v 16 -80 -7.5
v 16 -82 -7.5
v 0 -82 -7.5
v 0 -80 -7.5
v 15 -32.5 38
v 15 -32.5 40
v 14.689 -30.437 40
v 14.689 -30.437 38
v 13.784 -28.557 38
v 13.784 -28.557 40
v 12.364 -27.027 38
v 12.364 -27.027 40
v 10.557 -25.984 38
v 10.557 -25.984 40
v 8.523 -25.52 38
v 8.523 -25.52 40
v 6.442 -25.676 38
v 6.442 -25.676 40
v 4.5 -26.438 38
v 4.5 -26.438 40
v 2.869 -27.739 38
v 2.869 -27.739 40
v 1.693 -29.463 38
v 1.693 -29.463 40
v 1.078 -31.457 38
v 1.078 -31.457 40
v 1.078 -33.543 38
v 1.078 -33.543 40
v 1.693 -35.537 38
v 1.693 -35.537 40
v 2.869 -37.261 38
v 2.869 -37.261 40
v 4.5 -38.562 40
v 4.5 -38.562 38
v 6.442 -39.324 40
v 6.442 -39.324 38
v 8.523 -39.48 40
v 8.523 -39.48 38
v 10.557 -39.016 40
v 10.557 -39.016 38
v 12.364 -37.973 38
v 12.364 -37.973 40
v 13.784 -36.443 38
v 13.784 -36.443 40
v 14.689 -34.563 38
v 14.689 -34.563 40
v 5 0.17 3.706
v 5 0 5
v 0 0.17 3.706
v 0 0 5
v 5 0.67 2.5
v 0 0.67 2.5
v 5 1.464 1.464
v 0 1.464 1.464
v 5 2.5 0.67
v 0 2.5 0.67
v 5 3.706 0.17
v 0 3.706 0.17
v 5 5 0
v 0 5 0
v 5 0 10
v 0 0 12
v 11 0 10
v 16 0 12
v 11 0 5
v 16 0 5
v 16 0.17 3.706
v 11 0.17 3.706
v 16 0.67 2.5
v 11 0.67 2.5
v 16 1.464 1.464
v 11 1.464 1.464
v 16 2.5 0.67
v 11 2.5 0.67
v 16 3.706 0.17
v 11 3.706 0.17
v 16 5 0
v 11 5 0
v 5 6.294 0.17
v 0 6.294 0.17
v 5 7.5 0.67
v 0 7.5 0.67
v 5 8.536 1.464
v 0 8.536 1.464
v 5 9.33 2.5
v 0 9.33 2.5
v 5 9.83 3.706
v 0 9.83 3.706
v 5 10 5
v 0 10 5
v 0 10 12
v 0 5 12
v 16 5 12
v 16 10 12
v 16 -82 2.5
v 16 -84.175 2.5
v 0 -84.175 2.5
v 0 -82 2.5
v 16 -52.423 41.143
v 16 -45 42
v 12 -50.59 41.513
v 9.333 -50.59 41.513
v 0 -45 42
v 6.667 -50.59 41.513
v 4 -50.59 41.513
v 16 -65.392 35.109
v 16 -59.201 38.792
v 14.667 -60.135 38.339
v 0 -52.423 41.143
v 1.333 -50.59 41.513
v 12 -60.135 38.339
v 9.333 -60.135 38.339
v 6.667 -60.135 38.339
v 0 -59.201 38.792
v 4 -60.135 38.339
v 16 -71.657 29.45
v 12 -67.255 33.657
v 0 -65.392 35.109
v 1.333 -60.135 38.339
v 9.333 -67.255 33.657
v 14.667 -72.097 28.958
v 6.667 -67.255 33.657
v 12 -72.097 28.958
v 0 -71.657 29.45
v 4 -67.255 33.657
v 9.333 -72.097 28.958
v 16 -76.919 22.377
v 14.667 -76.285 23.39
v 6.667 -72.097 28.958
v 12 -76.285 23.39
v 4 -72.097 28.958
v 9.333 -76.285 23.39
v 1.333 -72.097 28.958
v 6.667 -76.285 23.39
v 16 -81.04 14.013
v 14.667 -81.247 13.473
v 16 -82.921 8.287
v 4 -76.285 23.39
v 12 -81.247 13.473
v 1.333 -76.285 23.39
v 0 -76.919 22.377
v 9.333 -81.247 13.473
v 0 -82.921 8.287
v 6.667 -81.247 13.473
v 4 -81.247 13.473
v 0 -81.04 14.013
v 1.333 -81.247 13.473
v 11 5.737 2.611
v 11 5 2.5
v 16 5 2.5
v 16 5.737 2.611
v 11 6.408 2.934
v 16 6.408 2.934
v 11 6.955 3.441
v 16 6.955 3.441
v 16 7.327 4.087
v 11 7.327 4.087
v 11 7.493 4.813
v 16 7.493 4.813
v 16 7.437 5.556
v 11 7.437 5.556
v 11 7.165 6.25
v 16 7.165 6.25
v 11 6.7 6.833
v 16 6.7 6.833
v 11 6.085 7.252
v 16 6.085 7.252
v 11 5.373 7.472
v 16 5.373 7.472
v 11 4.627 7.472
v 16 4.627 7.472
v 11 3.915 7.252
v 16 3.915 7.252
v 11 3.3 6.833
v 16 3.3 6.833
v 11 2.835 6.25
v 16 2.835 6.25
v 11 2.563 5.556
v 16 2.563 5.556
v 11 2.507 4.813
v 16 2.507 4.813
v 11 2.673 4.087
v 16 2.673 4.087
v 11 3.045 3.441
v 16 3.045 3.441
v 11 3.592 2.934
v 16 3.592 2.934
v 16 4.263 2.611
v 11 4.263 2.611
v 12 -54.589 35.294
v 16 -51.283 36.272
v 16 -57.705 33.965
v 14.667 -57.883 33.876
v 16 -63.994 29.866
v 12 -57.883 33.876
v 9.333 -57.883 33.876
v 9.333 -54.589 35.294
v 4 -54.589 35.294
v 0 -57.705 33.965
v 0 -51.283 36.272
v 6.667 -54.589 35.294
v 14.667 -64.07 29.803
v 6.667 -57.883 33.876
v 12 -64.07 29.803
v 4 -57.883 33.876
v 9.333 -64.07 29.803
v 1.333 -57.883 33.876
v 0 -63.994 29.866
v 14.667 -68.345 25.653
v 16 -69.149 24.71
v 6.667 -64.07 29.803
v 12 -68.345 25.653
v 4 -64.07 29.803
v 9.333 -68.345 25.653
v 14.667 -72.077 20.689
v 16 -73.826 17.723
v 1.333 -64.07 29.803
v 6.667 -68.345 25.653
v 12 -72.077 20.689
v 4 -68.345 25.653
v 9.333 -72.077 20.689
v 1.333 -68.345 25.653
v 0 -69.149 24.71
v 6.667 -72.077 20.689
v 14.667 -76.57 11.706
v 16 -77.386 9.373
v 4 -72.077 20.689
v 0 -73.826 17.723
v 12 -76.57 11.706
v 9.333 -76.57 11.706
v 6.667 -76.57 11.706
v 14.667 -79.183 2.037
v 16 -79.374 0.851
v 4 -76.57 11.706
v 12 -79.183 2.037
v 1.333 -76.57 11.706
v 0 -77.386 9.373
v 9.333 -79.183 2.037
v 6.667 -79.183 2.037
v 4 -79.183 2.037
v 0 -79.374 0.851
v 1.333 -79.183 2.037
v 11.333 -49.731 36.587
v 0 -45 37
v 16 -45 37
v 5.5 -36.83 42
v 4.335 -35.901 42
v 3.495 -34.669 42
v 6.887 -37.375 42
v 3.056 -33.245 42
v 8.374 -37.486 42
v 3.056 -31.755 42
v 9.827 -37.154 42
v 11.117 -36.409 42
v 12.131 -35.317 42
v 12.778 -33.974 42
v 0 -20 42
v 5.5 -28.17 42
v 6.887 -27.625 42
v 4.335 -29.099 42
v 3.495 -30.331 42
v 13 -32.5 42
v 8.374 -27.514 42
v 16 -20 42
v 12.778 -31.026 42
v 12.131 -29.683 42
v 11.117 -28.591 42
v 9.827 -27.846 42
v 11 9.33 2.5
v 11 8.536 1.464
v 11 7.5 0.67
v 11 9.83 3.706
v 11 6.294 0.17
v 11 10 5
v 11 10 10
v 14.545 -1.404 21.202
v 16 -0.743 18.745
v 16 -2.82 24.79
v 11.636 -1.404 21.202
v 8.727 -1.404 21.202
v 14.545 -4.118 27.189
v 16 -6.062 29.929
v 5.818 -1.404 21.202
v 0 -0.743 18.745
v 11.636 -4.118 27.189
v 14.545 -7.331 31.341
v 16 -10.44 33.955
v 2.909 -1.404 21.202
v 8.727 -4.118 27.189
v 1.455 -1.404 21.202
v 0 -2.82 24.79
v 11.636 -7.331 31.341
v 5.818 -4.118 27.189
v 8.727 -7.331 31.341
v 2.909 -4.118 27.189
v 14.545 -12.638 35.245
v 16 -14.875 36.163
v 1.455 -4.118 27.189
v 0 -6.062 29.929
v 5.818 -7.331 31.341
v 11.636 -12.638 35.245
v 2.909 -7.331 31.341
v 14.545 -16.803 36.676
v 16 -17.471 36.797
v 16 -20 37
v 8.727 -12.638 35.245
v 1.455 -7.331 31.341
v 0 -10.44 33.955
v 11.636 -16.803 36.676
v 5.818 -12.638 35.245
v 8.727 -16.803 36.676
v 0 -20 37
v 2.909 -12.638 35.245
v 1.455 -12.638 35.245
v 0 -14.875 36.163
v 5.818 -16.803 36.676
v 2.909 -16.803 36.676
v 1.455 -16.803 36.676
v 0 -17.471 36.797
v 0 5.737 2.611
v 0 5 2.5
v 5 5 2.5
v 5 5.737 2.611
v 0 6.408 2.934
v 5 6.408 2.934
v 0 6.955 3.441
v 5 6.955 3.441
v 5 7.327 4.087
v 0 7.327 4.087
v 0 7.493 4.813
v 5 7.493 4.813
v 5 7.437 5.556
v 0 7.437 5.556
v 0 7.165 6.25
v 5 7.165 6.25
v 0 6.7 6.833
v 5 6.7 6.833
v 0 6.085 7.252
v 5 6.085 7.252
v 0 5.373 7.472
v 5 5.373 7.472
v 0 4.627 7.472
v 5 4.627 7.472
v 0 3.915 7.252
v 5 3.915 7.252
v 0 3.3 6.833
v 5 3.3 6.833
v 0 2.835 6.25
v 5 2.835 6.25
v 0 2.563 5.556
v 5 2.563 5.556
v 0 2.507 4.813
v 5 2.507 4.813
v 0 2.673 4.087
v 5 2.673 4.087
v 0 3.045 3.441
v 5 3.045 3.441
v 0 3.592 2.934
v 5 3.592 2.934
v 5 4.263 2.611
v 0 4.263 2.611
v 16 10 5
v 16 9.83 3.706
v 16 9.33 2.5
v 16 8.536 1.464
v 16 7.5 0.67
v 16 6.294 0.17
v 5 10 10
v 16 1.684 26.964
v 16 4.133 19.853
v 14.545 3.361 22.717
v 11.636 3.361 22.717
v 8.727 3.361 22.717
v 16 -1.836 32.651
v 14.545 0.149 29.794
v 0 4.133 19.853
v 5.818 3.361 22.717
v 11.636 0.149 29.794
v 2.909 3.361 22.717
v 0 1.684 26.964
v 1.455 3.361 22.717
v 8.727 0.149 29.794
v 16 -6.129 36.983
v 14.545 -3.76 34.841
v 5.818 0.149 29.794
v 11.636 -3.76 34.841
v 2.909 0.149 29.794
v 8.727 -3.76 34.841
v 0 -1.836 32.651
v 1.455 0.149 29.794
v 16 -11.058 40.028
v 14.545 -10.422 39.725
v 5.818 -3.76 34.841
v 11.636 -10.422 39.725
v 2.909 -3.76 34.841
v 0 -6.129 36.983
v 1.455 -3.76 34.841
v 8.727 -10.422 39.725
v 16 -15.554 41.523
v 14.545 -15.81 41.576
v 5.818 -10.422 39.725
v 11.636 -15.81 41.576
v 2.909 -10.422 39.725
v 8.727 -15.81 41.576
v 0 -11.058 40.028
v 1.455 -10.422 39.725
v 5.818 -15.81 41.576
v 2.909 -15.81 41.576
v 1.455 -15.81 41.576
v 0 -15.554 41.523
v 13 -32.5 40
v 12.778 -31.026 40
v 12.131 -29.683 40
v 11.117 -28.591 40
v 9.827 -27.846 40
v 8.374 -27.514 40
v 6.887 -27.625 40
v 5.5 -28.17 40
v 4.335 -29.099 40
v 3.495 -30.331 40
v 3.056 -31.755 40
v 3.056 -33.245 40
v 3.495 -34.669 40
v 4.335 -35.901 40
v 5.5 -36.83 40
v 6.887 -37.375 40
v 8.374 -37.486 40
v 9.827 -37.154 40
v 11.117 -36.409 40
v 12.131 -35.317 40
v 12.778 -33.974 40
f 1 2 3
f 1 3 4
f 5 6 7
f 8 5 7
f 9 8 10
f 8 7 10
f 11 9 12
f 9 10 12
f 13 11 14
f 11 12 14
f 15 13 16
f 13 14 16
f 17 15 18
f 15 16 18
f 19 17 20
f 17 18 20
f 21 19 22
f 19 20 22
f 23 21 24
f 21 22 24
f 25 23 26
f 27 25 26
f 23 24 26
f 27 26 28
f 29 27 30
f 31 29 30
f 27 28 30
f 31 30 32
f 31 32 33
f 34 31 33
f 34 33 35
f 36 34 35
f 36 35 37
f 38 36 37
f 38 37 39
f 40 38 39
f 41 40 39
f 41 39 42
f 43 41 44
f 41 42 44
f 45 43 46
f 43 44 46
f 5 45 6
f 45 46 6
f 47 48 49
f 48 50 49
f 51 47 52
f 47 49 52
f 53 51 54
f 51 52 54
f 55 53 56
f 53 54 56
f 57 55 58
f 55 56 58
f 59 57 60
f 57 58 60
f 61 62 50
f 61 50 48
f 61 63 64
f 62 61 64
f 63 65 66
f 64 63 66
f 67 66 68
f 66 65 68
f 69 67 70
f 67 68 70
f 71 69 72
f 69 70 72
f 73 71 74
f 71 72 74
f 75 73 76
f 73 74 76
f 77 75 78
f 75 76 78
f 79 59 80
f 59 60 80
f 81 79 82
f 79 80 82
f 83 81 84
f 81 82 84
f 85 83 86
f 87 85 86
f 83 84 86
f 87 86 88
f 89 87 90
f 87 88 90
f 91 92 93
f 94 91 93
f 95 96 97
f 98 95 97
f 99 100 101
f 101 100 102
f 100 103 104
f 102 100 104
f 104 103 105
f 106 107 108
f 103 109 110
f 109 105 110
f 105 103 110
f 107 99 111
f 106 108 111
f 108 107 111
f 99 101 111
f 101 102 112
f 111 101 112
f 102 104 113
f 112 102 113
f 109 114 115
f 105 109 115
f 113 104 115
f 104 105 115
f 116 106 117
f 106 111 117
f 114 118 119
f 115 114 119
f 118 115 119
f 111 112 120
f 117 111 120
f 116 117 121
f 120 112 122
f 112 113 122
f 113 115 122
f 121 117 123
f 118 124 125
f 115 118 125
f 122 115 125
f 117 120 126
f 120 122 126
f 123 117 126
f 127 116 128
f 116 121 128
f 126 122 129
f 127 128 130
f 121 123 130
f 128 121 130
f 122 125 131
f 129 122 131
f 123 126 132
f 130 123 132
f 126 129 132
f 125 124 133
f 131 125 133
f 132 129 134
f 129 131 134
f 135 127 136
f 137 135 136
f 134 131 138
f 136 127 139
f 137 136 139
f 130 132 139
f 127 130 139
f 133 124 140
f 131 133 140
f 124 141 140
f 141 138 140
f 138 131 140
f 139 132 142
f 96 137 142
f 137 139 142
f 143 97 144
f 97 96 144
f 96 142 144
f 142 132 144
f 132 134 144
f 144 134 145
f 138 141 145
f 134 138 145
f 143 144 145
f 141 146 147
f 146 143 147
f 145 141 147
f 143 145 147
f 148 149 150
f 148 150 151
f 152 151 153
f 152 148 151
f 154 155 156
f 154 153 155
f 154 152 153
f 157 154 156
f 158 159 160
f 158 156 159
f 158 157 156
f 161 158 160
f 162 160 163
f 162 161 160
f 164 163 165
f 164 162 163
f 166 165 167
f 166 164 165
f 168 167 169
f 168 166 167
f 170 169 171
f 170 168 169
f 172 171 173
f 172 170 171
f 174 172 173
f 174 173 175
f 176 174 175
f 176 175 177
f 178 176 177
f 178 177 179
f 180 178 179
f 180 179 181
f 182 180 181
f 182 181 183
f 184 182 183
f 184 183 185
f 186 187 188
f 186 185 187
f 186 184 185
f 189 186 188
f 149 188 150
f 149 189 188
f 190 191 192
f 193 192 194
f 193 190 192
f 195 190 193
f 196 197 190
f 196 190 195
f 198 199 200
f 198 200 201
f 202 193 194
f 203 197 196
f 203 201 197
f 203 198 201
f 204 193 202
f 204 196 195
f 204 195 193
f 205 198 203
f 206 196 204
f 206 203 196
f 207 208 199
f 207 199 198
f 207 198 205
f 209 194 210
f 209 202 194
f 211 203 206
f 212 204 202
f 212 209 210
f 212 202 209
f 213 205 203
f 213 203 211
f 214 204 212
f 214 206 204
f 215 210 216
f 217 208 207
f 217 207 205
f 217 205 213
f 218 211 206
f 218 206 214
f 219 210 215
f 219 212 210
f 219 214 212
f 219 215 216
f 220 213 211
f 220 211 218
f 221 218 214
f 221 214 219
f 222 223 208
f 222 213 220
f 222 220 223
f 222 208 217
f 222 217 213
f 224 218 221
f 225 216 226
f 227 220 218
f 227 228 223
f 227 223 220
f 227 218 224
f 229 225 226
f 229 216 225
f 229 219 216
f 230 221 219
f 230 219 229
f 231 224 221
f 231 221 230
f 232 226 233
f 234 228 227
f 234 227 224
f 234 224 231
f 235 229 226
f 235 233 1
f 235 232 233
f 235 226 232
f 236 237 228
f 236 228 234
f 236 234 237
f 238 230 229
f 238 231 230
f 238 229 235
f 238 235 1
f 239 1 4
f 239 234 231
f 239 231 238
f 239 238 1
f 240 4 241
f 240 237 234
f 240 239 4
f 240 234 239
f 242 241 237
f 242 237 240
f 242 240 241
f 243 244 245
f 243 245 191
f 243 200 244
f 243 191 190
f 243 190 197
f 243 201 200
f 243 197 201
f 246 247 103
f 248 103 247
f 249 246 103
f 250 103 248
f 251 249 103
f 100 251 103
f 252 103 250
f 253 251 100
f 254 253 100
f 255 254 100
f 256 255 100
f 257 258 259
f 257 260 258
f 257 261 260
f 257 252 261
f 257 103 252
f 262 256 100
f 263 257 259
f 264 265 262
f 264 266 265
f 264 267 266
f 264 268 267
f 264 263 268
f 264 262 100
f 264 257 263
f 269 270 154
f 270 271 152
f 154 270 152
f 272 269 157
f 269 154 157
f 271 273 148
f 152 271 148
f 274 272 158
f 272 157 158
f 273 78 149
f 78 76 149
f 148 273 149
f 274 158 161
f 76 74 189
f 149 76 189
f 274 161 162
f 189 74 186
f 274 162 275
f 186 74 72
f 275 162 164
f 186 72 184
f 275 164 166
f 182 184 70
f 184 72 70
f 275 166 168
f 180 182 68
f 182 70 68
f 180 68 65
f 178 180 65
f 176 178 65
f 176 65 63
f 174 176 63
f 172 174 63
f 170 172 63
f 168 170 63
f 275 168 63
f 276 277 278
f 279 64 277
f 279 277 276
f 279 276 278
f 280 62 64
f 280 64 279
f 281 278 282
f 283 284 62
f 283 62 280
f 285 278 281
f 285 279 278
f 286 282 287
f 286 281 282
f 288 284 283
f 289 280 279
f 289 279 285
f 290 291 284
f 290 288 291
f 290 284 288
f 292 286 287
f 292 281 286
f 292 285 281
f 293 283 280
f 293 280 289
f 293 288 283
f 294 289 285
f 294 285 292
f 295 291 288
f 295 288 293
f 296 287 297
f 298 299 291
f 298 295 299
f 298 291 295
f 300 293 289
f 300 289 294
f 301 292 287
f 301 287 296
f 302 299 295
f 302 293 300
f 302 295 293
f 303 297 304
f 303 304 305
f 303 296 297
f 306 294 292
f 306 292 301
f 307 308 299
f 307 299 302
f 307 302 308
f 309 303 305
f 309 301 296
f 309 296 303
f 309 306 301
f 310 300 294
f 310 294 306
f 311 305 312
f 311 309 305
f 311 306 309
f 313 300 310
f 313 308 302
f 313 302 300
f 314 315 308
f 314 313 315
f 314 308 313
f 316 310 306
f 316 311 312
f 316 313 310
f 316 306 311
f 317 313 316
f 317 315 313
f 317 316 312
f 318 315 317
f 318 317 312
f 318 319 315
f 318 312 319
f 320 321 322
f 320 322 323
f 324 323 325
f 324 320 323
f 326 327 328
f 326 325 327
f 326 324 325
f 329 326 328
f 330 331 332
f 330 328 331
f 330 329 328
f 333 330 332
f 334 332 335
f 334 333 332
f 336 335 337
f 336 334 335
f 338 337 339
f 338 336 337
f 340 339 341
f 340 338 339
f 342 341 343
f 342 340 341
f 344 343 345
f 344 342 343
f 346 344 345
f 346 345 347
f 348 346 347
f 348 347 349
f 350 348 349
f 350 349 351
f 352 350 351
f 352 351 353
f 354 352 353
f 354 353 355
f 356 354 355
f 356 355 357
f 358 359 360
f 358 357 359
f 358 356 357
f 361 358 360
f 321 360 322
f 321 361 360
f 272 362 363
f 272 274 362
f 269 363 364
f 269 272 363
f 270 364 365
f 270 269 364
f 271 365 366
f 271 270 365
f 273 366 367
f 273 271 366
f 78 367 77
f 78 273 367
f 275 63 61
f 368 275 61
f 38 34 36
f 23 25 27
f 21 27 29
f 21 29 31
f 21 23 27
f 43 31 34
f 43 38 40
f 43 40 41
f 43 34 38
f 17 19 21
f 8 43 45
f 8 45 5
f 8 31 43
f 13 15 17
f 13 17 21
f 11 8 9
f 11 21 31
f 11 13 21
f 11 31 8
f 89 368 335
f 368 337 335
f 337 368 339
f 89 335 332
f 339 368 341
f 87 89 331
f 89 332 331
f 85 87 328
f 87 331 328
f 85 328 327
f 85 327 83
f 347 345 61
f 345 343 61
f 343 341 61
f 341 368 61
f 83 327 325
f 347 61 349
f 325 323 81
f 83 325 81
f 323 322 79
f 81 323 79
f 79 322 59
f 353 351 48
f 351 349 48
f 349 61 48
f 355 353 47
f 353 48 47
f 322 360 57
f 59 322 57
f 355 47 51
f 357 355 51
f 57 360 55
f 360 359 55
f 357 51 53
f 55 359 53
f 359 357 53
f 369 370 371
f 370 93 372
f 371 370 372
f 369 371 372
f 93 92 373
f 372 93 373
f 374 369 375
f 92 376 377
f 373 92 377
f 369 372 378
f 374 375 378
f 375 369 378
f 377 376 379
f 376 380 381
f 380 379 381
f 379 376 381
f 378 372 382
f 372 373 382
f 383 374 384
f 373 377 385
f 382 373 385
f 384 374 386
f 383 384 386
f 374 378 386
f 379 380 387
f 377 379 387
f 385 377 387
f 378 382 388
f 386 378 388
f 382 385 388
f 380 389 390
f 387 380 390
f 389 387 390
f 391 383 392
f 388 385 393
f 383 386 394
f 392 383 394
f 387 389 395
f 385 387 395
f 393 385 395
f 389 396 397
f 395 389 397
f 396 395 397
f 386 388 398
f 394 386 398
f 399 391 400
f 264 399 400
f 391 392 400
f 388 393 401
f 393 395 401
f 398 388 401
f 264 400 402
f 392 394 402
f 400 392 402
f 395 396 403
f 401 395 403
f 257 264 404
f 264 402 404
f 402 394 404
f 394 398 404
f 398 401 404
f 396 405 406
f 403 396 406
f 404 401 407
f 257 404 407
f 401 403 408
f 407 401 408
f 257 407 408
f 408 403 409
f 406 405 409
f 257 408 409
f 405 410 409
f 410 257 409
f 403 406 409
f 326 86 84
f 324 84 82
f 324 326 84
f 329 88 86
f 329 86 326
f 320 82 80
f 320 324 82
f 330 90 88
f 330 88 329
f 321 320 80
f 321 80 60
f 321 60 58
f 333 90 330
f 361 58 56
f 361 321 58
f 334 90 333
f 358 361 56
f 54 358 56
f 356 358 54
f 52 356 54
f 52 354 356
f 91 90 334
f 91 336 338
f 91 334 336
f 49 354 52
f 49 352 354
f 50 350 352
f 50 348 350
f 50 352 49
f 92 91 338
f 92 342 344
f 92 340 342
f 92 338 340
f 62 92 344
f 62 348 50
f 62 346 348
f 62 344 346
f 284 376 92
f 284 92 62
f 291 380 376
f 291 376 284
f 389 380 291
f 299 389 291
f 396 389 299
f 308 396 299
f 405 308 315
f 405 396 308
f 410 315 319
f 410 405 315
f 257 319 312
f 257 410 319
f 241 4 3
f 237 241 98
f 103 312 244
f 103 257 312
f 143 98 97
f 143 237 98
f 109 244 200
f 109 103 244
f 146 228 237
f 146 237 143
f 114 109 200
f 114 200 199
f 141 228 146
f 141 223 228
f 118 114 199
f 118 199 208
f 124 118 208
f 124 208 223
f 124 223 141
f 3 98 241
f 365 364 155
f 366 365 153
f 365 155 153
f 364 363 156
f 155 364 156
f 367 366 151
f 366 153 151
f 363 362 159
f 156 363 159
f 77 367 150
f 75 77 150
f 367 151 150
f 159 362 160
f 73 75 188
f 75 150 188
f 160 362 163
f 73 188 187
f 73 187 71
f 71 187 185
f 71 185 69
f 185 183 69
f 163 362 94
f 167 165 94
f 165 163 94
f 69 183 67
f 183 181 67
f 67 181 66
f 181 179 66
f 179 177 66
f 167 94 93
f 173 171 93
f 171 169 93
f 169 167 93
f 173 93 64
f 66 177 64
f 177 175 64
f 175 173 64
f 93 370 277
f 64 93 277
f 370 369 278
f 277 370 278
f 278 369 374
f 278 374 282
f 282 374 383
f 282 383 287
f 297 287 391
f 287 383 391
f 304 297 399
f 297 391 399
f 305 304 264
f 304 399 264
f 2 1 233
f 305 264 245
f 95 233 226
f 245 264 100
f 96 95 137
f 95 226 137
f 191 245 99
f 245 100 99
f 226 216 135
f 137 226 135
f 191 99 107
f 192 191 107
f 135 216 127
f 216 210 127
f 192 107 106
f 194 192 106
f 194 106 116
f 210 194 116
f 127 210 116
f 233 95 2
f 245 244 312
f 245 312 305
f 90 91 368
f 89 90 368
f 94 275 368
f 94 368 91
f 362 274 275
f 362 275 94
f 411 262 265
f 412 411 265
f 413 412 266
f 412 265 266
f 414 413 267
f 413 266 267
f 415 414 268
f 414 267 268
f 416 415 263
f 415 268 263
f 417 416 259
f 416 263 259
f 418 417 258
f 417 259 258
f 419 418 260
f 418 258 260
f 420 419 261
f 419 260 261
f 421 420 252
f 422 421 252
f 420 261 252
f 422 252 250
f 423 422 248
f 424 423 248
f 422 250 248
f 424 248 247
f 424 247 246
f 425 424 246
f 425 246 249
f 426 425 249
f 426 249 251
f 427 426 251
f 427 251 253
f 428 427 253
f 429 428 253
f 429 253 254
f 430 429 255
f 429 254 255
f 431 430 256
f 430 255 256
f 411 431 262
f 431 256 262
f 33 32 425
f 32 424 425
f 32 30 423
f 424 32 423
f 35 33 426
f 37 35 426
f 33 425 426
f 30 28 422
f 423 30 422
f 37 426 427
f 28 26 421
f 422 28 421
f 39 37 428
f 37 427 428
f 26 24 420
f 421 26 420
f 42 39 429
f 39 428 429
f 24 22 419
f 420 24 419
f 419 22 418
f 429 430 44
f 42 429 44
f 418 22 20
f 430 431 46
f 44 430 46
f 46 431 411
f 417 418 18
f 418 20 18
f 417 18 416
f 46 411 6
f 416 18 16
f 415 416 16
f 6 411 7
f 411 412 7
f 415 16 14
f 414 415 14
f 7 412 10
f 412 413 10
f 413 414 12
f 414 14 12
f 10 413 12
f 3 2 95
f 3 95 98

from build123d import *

# Parameters (mm, degrees)
BOSS_EXTRUDE2_DEPTH     = 10
CUT_EXTRUDE1_DEPTH      = 20.104973175
CUT_EXTRUDE1_DEPTH_BACK = 20.104973175
SKETCH3_R               = 2.5
SWEEP2_DEPTH            = 16
SKETCH6_W               = 16
SKETCH6_H               = 5
BOSS_EXTRUDE3_DEPTH     = 25
SWEEP4_DEPTH            = 16
SKETCH10_R              = 5
CUT_EXTRUDE2_DEPTH      = 2
SKETCH11_R              = 7
CUT_EXTRUDE3_DEPTH      = 2
CUT_EXTRUDE4_DEPTH      = 3
FILLET1_R               = 5


# Read off the part's stored shape, not the designer's step: Sweep2, Sweep4
with BuildPart() as part:
    # Sketch1 → Boss-Extrude2 (new body)
    with BuildSketch(Plane(origin=(0, 0, 0), x_dir=(1, 0, 0), z_dir=(0, 1, 0))):
        Polygon((16, 0), (11, 0), (11, -10), (5, -10), (5, 0), (0, 0), (0, -12), (16, -12), align=None)
    extrude(amount=BOSS_EXTRUDE2_DEPTH)

    # Sketch3 → Cut-Extrude1 (cut, two sides: drawn at the far end of the back side and taken through both)
    with BuildSketch(Plane(origin=(5, 0, 0), x_dir=(0, 0, -1), z_dir=(1, 0, 0)).offset(-CUT_EXTRUDE1_DEPTH_BACK)):
        with Locations((-5, 5)):
            Circle(SKETCH3_R)
    extrude(amount=CUT_EXTRUDE1_DEPTH + CUT_EXTRUDE1_DEPTH_BACK, mode=Mode.SUBTRACT)

    # Sweep2 outline → Sweep2 (add)
    with BuildSketch(Plane.YZ):
        with BuildLine():
            Line((0, 12), (5, 12))
            add(Edge.make_bspline(
                [(5, 12), (4.988564835, 13.918737728), (4.727583023, 17.475192083), (3.864503942, 21.128495988), (3.223332084, 23.150620925), (2.391953002, 25.596644311), (0.741742694, 29.07437946), (-1.195562511, 31.850987055), (-2.528545692, 33.517302555), (-4.236222293, 35.44635739), (-7.052881596, 37.829760239), (-9.410175401, 39.223738473), (-10.800753457, 39.913031483), (-12.581881784, 40.734670966), (-15.819763626, 41.734575995), (-18.630582656, 41.980830062), (-20, 42)],
                knots=[0, 0, 0, 0, 0.14, 0.25, 0.25, 0.28, 0.42, 0.5, 0.5, 0.56, 0.67, 0.75, 0.75, 0.78, 0.89, 1, 1, 1, 1], degree=3))
            Line((-20, 42), (-20, 37))
            add(Edge.make_bspline(
                [(0, 12), (0, 13.649915823), (-0.240561875, 16.726331061), (-0.97538393, 19.848301285), (-1.521193083, 21.57165859), (-2.228979288, 23.654488426), (-3.634756743, 26.603340395), (-5.233025509, 28.896620946), (-6.326493526, 30.263455967), (-7.72168743, 31.836224776), (-10.002621636, 33.761203681), (-11.850285326, 34.854843846), (-12.93353849, 35.390906407), (-14.317667102, 36.027380757), (-16.81674582, 36.792085808), (-18.962910054, 37), (-20, 37)],
                knots=[0, 0, 0, 0, 0.14, 0.25, 0.25, 0.28, 0.42, 0.5, 0.5, 0.56, 0.67, 0.75, 0.75, 0.78, 0.89, 1, 1, 1, 1], degree=3))
        make_face()
    extrude(amount=SWEEP2_DEPTH)

    # Sketch6 → Boss-Extrude3 (add)
    with BuildSketch(Plane.XZ.offset(20)):
        with Locations((8, 39.5)):
            Rectangle(SKETCH6_W, SKETCH6_H)
    extrude(amount=BOSS_EXTRUDE3_DEPTH)

    # Sweep4 outline → Sweep4 (add)
    with BuildSketch(Plane.YZ):
        with BuildLine():
            add(Edge.make_bspline(
                [(-45, 37), (-46.539921435, 37), (-49.710455321, 36.733564359), (-54.069426949, 35.591421338), (-56.791855208, 34.424962301), (-58.400322026, 33.61534539), (-60.515823703, 32.472825795), (-64.131778614, 29.955184919), (-67.512968495, 26.682711344), (-69.293125668, 24.545529462), (-70.568838354, 22.923551904), (-73.245629189, 19.149689178), (-75.823464115, 13.964627374), (-77.246943912, 9.829702386), (-78.247594027, 6.616051335), (-79.558969896, 1.063749954), (-80, -4.423299828), (-80, -7.5)],
                knots=[0, 0, 0, 0, 0.093333333, 0.186666667, 0.25, 0.25, 0.28, 0.373333333, 0.466666667, 0.5, 0.5, 0.56, 0.706666667, 0.75, 0.75, 0.853333333, 1, 1, 1, 1], degree=3))
            Line((-45, 37), (-45, 42))
            add(Edge.make_bspline(
                [(-45, 42), (-46.827228691, 41.985546272), (-50.572377089, 41.690203176), (-55.680170711, 40.34427149), (-58.86435237, 38.978190659), (-60.736493627, 38.036368786), (-63.19327858, 36.710836458), (-67.336625432, 33.820292899), (-71.161008214, 30.117283698), (-73.164977368, 27.709927549), (-74.598724896, 25.886689015), (-77.598031299, 21.658467407), (-80.427894177, 15.95136859), (-81.990291212, 11.413560853), (-83.08845552, 7.889758882), (-84.526539356, 1.812231065), (-84.988008876, -4.14655051), (-85, -7.5)],
                knots=[0, 0, 0, 0, 0.093333333, 0.186666667, 0.25, 0.25, 0.28, 0.373333333, 0.466666667, 0.5, 0.5, 0.56, 0.706666667, 0.75, 0.75, 0.853333333, 1, 1, 1, 1], degree=3))
            Line((-85, -7.5), (-80, -7.5))
        make_face()
    extrude(amount=SWEEP4_DEPTH)

    # Sketch10 → Cut-Extrude2 (cut)
    with BuildSketch(Plane.XY.offset(42)):
        with Locations((8, -32.5)):
            Circle(SKETCH10_R)
    extrude(amount=-CUT_EXTRUDE2_DEPTH, mode=Mode.SUBTRACT)

    # Sketch11 → Cut-Extrude3 (cut)
    with BuildSketch(Plane.XY.offset(40)):
        with Locations((8, -32.5)):
            Circle(SKETCH11_R)
    extrude(amount=-CUT_EXTRUDE3_DEPTH, mode=Mode.SUBTRACT)

    # 3DSketch1 → Cut-Extrude4 (cut)
    with BuildSketch(Plane(origin=(0, -85, -7.5), x_dir=(0.8479983040050887, 0, 0.5299989400031789), z_dir=(0, 1, 0))):
        Polygon((0, 0), (13.567972864, 8.47998304), (18.867962264, 0), (5.2999894, -8.47998304), align=None)
    extrude(amount=CUT_EXTRUDE4_DEPTH, mode=Mode.SUBTRACT)

    # Fillet1
    fillet1_edges = [part.edges().sort_by_distance(p)[0] for p in [
        (13.5, 0, 0),
        (13.5, 10, 0),
        (2.5, 0, 0),
        (2.5, 10, 0),
    ]]
    fillet(fillet1_edges, radius=FILLET1_R - 0.0001)  # a hair under: the kernel refuses the full size


solid = part.part
